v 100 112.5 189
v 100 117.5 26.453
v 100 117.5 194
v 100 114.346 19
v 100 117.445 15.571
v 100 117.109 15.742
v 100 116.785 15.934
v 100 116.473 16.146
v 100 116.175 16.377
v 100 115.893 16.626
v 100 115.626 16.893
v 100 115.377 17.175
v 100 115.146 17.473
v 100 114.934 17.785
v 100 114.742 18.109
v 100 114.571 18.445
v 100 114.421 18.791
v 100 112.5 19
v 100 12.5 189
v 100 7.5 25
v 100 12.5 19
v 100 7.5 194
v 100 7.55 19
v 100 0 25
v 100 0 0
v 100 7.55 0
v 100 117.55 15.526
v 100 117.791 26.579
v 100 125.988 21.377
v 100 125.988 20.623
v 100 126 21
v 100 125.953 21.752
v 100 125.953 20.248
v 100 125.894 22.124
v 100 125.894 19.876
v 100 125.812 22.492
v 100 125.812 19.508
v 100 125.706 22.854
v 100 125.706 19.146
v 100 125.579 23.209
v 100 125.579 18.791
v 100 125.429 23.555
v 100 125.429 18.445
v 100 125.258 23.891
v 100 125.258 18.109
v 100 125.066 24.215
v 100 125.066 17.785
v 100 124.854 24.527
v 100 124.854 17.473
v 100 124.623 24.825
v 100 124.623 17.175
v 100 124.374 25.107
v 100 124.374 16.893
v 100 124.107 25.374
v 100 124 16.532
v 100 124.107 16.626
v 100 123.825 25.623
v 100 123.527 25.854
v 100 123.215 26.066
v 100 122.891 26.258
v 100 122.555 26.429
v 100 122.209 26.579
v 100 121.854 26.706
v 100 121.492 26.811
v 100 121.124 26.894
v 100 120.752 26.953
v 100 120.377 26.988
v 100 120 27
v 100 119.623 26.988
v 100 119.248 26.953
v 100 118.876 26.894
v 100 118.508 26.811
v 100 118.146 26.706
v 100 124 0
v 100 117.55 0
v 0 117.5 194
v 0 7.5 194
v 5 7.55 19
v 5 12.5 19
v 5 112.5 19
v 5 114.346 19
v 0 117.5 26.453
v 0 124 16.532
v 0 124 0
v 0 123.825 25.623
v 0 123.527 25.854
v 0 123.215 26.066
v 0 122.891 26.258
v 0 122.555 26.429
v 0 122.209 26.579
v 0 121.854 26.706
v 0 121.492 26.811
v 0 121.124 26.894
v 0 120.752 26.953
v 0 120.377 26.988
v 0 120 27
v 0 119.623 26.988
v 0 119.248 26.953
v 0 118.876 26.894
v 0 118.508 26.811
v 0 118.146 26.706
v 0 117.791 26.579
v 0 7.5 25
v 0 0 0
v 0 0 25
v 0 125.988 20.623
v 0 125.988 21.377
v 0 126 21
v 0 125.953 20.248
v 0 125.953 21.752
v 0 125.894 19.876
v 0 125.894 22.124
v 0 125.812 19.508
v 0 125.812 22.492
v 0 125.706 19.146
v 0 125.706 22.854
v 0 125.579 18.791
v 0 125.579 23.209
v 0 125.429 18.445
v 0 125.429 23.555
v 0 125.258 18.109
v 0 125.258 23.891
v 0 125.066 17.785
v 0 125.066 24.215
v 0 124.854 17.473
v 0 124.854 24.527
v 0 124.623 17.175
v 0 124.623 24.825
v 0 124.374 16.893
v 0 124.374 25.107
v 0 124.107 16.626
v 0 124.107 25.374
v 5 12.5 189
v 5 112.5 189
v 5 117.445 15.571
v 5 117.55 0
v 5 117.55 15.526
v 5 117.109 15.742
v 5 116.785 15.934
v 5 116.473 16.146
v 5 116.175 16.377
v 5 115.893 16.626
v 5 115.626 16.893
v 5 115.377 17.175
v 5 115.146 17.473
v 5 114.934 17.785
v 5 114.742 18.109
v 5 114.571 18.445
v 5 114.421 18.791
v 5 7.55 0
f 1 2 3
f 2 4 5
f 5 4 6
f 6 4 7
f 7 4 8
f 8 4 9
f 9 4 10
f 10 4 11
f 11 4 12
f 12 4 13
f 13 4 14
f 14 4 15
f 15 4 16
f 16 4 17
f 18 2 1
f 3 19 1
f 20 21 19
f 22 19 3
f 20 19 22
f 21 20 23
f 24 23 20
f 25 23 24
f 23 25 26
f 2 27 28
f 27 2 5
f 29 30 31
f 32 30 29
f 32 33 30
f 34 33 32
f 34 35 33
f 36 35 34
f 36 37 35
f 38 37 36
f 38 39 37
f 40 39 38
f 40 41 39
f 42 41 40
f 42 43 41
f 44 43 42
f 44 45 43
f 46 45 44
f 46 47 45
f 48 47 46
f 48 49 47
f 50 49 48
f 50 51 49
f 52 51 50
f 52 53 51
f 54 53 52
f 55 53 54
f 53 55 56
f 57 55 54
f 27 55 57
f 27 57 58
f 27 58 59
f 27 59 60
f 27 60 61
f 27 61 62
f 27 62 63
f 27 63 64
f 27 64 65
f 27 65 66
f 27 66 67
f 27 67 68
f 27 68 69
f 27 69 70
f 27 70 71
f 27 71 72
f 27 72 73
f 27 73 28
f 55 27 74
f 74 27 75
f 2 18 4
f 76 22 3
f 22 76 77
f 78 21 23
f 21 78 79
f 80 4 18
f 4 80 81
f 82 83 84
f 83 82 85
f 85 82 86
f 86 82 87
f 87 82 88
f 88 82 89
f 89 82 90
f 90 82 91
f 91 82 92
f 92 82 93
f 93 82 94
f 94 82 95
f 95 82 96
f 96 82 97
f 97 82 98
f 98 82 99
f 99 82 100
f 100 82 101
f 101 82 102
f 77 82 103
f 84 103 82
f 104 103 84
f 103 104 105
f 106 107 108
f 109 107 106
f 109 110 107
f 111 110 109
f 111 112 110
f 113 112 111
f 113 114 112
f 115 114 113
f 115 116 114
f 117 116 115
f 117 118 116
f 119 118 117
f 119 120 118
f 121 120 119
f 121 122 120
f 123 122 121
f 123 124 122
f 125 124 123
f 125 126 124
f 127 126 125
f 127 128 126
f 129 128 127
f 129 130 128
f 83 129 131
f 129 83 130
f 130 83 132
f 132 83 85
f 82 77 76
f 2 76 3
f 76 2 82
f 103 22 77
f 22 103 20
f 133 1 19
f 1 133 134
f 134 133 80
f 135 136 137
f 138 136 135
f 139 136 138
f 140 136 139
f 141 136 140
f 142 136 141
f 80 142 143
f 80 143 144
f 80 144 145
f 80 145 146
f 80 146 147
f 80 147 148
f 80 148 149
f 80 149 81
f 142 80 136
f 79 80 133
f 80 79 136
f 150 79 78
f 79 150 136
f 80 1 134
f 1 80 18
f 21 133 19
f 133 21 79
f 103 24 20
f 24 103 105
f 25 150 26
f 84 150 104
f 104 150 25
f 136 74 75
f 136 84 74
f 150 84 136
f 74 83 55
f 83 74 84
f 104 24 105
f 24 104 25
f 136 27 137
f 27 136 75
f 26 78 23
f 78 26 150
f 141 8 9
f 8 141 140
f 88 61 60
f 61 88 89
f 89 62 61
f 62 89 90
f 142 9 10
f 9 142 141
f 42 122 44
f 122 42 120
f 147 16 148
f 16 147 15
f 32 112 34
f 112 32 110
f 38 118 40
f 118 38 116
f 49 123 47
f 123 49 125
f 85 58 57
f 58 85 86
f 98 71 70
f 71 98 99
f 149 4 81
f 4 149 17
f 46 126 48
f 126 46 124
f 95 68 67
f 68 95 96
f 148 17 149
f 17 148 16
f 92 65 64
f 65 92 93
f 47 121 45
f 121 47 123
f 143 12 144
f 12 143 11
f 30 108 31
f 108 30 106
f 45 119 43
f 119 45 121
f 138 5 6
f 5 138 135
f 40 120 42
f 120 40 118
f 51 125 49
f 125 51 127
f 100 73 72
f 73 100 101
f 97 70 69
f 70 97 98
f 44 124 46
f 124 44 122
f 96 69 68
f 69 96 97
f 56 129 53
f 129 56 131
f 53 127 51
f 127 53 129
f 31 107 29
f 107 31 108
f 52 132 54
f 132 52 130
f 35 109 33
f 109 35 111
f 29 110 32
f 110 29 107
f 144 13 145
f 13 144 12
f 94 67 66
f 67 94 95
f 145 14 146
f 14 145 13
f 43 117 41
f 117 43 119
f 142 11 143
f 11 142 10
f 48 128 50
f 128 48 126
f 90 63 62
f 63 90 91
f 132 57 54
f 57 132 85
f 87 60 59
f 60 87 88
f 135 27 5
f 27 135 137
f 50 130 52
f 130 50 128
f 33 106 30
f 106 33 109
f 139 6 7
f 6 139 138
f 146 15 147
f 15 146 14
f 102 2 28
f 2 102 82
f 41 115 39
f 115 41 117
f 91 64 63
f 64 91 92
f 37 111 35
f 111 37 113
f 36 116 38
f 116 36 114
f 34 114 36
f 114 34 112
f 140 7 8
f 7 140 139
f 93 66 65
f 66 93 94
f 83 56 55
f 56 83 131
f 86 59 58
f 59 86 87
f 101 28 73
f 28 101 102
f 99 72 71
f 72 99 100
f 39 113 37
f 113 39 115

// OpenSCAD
translate([0,7.5,19]) difference() {
    cube([100,110,175]);
    translate([5,5,0]) cube([110,100,170]);
}





difference() {
    cube([100,124,25]);
    translate([5,7.55,0]) cube([95,110,25]);
}

translate([0,120,21]) rotate([0,90,0]) cylinder(100,6,6, false, $fn=100);
